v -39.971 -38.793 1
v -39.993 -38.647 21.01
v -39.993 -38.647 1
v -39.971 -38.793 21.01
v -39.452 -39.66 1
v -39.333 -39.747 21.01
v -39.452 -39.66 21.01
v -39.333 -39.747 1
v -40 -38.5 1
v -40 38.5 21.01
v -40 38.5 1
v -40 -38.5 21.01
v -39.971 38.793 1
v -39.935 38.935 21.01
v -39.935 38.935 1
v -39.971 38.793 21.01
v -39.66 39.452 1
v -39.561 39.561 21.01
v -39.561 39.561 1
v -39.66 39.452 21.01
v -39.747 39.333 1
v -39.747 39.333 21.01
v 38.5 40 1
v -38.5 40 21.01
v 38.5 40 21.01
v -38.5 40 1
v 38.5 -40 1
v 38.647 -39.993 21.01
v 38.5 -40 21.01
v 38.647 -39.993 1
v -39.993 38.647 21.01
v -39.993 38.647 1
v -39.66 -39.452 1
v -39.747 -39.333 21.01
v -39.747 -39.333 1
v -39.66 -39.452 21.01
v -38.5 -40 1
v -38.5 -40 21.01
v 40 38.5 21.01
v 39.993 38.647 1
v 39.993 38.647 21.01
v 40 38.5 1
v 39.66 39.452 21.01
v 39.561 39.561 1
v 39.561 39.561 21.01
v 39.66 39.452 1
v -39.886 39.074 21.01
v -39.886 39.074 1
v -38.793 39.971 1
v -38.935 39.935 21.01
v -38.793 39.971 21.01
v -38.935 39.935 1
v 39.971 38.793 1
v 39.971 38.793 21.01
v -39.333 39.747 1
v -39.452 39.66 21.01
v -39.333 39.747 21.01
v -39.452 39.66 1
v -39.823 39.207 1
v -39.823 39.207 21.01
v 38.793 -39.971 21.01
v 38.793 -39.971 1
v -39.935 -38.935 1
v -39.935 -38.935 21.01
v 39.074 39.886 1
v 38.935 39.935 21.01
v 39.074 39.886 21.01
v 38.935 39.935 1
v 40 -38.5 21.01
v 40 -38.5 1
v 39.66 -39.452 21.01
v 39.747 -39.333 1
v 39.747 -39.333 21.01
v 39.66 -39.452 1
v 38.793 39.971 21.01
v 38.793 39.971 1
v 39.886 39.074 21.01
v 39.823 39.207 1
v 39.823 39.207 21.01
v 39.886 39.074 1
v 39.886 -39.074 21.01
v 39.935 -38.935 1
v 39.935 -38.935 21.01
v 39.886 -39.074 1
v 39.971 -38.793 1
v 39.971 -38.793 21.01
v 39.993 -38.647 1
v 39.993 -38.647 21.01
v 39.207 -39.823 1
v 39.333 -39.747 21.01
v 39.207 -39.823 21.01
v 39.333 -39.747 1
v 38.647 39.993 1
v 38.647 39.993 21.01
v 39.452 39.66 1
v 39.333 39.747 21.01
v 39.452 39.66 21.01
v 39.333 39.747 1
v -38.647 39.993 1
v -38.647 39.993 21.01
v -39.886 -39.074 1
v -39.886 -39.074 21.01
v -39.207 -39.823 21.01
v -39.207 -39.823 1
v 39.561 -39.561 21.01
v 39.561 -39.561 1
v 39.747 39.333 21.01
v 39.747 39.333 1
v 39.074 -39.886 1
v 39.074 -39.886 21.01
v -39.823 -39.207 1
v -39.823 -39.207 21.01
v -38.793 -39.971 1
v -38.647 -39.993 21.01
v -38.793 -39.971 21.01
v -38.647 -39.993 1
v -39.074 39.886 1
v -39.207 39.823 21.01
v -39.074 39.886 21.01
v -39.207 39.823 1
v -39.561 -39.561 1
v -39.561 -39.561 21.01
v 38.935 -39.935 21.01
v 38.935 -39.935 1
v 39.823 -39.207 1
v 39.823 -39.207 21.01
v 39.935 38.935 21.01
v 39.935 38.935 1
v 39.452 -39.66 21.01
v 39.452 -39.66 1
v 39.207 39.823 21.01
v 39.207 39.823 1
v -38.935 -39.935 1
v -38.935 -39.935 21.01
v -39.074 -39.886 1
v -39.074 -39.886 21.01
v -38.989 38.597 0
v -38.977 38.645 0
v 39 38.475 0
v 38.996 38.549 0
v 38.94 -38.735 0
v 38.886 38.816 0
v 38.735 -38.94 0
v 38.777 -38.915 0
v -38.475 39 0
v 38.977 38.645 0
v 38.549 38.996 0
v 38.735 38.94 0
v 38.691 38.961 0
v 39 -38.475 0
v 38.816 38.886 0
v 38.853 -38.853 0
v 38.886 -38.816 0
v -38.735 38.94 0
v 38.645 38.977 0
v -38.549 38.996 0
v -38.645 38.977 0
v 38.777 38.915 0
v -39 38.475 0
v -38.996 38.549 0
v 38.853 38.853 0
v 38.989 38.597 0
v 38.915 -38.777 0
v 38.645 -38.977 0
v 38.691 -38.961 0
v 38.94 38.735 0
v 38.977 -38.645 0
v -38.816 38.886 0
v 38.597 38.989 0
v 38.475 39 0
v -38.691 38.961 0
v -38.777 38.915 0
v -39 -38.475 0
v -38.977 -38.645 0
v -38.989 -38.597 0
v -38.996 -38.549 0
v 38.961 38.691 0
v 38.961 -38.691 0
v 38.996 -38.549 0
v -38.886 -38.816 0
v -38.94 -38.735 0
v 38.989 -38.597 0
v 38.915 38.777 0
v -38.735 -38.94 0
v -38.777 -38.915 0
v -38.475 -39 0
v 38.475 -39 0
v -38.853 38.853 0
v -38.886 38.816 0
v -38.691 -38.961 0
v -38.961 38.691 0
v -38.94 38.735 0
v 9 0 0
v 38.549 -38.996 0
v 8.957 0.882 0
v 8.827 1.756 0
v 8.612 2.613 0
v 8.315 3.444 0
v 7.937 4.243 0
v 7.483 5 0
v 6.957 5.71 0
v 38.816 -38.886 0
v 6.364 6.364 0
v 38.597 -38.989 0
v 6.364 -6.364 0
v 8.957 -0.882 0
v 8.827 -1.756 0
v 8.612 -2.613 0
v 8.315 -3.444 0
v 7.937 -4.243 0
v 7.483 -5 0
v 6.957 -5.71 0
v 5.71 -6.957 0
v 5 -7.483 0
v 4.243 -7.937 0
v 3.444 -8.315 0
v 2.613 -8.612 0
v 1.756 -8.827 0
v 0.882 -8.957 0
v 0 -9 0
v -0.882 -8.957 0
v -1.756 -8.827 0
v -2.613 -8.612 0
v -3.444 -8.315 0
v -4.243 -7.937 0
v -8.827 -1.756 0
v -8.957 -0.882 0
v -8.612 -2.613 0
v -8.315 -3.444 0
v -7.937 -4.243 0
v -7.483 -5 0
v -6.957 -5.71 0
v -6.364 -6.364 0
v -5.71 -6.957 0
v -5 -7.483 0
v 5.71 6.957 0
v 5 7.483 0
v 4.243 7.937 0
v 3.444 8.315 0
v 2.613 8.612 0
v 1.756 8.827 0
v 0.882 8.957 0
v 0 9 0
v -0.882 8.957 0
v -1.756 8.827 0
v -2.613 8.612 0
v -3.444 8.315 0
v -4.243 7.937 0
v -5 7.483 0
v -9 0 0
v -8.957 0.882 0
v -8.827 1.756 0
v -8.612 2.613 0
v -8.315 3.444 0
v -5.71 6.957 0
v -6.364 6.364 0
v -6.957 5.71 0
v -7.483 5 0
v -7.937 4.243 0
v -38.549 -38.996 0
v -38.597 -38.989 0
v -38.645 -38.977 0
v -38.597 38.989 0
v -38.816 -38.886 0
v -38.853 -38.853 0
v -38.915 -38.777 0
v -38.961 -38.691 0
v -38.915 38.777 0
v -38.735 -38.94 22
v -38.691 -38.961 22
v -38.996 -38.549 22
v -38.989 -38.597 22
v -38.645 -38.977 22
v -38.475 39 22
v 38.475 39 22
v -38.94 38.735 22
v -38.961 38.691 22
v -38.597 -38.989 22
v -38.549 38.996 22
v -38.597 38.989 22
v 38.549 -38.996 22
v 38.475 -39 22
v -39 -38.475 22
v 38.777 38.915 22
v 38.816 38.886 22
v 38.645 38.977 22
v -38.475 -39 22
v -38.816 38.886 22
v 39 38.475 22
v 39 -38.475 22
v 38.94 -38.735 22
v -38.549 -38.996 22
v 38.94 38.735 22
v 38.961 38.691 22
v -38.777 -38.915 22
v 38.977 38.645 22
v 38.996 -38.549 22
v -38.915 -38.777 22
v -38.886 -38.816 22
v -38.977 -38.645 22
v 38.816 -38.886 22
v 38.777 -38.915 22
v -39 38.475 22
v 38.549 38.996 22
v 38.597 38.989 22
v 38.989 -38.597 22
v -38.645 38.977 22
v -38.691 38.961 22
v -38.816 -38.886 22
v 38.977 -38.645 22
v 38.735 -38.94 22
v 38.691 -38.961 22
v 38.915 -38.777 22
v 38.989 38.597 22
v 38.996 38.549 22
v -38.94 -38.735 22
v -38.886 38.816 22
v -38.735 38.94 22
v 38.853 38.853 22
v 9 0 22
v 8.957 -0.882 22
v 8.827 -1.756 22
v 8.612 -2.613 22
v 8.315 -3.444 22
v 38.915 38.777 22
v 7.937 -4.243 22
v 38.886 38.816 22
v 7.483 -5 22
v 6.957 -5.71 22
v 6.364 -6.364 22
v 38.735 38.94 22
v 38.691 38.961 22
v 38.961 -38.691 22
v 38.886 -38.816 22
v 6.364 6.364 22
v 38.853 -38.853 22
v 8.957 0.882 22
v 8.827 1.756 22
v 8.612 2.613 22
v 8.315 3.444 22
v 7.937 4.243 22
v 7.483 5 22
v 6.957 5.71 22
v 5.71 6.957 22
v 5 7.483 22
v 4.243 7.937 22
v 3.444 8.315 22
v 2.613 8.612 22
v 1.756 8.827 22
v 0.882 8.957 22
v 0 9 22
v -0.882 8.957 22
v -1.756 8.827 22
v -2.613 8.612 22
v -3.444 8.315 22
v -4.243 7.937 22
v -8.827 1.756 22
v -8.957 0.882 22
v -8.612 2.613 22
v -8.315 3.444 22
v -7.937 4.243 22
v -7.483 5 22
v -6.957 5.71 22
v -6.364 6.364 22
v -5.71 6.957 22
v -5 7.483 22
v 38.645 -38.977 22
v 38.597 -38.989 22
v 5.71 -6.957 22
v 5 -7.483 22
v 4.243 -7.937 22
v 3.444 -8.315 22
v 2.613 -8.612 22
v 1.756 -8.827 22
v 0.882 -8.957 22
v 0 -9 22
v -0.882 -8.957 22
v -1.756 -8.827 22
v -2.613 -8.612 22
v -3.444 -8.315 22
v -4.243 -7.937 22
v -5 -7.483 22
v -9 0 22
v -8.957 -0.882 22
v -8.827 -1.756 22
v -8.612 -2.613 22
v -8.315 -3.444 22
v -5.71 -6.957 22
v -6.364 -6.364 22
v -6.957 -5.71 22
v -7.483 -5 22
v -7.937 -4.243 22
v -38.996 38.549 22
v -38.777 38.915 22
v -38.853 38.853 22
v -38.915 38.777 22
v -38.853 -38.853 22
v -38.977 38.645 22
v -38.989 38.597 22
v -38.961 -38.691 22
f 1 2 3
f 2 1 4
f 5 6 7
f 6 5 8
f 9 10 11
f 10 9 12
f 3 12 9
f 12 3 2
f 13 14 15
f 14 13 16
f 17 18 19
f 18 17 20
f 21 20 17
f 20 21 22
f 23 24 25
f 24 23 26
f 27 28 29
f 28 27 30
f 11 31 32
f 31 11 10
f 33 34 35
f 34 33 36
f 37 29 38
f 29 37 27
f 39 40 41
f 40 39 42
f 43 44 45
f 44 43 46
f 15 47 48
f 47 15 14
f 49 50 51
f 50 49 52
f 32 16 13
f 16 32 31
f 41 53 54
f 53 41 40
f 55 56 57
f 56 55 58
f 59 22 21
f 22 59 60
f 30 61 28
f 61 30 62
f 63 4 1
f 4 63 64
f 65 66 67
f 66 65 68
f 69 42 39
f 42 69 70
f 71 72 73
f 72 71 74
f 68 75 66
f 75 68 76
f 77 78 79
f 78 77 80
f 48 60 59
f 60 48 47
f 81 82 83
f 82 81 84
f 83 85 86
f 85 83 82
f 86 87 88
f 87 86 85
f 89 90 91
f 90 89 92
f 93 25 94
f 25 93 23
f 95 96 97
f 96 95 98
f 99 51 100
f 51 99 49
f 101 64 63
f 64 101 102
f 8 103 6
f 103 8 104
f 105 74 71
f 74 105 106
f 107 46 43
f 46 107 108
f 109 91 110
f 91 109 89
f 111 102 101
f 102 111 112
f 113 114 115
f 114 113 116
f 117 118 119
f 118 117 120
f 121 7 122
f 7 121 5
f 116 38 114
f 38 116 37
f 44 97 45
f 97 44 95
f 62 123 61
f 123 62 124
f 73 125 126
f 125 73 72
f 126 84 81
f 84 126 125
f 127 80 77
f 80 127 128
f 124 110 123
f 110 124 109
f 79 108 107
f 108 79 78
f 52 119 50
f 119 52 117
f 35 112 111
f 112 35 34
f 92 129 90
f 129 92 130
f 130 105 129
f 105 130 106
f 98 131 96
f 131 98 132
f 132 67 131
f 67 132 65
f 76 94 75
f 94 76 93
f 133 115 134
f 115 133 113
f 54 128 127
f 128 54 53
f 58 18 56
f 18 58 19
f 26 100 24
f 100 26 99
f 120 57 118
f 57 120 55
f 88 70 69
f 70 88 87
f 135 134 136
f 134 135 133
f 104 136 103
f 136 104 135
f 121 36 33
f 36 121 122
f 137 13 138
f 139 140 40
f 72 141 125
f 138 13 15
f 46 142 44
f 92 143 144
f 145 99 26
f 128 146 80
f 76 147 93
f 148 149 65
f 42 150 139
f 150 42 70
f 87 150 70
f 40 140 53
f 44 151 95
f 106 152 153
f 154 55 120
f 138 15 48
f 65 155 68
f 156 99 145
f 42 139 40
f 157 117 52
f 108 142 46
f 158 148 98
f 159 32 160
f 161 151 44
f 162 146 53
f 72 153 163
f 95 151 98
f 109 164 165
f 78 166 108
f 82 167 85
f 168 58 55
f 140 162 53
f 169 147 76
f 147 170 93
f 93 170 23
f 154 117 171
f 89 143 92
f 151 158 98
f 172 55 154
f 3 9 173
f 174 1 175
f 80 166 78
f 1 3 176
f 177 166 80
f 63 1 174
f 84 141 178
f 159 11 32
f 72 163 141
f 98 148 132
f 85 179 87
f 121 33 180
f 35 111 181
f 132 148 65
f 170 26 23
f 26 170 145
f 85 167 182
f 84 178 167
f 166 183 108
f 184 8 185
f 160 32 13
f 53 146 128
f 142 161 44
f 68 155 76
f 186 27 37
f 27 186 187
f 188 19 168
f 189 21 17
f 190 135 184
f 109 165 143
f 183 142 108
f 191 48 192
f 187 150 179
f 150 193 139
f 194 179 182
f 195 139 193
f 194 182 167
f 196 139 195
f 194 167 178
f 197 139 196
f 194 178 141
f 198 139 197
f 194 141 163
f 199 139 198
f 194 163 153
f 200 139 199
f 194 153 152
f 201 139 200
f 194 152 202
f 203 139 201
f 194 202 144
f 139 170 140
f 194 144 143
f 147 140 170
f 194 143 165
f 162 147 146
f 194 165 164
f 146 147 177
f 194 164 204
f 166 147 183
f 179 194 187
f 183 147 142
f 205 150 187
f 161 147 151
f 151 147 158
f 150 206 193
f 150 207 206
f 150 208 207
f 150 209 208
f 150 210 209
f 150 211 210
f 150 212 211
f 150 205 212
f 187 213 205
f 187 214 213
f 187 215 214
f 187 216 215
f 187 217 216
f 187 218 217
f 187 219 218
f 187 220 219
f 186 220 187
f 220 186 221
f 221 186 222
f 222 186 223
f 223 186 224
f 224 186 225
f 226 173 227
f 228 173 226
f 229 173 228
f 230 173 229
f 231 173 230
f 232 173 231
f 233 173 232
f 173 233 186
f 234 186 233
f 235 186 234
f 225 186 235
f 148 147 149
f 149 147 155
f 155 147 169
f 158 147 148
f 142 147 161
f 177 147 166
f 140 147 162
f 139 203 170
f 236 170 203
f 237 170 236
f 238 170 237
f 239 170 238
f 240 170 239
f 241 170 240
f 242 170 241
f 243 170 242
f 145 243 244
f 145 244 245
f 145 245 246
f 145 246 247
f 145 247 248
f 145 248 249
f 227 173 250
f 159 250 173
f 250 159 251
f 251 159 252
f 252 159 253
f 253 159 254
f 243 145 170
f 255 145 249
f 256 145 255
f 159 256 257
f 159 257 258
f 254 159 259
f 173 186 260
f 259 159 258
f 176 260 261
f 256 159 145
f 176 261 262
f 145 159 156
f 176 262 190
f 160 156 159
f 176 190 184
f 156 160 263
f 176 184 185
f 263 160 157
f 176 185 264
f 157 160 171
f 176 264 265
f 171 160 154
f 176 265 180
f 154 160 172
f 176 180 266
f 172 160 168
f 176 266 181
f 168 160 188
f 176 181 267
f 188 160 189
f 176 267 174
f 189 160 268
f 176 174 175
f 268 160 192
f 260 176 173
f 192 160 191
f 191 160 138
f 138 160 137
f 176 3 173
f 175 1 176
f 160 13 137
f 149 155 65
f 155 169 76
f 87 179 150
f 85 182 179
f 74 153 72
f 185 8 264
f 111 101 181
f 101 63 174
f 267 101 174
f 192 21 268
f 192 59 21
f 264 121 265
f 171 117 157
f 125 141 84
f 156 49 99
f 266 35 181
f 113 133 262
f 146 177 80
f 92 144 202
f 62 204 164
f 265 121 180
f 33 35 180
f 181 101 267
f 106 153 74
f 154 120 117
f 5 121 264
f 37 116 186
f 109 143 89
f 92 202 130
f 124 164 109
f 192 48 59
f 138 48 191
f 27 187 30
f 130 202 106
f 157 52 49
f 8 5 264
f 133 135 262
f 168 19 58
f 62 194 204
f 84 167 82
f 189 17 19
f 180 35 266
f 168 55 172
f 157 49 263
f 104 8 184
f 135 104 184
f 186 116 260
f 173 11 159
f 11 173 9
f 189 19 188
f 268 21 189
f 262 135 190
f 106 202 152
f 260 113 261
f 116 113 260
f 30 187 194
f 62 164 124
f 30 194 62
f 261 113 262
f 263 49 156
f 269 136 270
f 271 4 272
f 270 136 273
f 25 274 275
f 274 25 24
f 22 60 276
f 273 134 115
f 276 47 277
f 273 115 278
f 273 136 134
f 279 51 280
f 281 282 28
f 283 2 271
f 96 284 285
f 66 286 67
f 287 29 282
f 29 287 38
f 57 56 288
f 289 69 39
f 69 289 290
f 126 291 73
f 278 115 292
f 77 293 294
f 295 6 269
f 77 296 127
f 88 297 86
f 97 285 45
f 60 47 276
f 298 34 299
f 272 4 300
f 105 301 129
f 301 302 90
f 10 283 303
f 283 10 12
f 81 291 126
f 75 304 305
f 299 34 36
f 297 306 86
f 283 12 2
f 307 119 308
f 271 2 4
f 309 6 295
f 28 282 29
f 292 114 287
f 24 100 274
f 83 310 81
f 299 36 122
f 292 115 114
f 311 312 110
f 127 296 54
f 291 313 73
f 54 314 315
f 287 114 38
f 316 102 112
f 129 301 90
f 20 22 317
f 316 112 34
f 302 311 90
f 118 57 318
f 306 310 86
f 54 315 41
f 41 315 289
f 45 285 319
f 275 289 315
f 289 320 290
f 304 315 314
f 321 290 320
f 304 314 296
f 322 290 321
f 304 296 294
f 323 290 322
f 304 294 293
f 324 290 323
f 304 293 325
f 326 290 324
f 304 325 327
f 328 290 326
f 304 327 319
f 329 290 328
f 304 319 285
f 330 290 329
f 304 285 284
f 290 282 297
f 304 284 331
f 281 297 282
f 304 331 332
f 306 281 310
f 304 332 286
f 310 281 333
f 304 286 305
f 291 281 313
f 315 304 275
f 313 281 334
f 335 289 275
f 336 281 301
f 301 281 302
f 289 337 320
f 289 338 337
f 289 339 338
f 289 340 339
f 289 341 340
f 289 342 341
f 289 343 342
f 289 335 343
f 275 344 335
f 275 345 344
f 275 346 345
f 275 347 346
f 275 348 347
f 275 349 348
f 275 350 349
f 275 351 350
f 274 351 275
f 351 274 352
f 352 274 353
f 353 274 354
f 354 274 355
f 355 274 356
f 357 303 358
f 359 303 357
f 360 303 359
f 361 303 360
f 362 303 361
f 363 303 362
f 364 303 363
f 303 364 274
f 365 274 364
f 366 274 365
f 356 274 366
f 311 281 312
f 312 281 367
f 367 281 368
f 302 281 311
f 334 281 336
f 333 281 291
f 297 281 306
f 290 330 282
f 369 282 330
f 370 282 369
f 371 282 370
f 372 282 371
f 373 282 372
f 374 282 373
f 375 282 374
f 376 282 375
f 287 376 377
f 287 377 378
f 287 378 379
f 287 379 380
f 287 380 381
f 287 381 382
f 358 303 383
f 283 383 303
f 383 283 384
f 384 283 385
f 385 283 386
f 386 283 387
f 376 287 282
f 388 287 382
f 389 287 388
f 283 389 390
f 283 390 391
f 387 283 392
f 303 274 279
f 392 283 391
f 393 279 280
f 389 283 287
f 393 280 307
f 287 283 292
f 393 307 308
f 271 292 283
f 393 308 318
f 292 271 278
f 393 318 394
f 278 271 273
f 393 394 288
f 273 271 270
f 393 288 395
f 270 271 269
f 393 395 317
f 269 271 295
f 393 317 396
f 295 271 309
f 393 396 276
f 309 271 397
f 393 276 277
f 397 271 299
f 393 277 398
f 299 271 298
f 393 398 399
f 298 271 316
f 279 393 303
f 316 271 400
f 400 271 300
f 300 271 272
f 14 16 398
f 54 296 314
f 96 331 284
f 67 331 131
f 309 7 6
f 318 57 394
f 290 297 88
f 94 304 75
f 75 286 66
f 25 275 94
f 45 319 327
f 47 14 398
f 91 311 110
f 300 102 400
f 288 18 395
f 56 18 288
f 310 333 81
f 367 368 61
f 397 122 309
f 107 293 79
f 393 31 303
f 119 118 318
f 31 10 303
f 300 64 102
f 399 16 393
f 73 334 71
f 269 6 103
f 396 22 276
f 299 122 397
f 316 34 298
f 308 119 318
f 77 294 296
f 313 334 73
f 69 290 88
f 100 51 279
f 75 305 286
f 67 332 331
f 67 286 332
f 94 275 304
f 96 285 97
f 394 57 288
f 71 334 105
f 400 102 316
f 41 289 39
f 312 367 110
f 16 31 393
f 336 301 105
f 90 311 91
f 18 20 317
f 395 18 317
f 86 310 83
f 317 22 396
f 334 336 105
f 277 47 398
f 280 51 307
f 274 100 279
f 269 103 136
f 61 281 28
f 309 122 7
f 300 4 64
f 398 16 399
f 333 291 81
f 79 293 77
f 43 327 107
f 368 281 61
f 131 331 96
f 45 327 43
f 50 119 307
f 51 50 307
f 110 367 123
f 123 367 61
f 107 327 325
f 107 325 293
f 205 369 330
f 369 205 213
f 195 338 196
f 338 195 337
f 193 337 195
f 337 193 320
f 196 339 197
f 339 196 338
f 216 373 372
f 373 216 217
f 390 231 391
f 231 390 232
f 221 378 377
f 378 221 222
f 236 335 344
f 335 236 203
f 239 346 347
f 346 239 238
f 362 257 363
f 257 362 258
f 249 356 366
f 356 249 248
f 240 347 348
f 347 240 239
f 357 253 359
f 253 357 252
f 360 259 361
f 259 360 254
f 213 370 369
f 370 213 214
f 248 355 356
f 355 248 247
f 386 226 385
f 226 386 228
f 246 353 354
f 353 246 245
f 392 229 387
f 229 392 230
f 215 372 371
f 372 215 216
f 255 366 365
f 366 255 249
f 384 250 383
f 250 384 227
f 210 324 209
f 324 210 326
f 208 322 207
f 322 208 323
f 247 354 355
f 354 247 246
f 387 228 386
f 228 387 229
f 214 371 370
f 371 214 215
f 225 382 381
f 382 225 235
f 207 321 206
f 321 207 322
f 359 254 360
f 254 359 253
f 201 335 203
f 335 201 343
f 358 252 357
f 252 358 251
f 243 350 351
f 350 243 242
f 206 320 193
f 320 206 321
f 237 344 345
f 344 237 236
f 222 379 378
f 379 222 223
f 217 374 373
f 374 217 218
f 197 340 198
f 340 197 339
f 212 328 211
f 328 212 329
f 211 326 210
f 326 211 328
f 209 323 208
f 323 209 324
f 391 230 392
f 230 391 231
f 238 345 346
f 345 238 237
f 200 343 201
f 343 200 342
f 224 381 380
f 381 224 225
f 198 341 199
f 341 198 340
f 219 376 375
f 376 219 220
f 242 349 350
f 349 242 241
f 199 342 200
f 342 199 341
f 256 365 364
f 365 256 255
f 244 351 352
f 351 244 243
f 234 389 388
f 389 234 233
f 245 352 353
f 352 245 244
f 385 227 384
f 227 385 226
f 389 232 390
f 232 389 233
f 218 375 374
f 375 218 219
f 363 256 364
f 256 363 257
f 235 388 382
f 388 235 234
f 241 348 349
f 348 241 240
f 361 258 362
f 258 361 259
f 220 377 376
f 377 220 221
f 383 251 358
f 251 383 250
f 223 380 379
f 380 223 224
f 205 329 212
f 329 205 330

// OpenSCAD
// BM-ISO-SM main body isolator pad, small-height stations
// J40 rubber recreation 3D model, units: millimetres.
// Generated by tools/generate_rubber_recreation_3d_models.py.
// OpenSCAD is the source model; export STL only after release parameters are set.

$fn = 64;

module rounded_rect_2d(size, r) {
  hull() {
    translate([-(size[0] / 2 - r), -(size[1] / 2 - r)]) circle(r = r);
    translate([ (size[0] / 2 - r), -(size[1] / 2 - r)]) circle(r = r);
    translate([ (size[0] / 2 - r),  (size[1] / 2 - r)]) circle(r = r);
    translate([-(size[0] / 2 - r),  (size[1] / 2 - r)]) circle(r = r);
  }
}

module capsule_2d(length, width) {
  hull() {
    translate([-(length - width) / 2, 0]) circle(d = width);
    translate([ (length - width) / 2, 0]) circle(d = width);
  }
}

module chamfered_extrude(height, edge_chamfer = 0) {
  eps = 0.01;
  if (edge_chamfer <= 0) {
    linear_extrude(height = height, center = false)
      children();
  } else {
    union() {
      translate([0, 0, edge_chamfer])
        linear_extrude(height = height - (2 * edge_chamfer), center = false)
          children();

      hull() {
        translate([0, 0, 0])
          linear_extrude(height = eps, center = false)
            offset(delta = -edge_chamfer)
              children();
        translate([0, 0, edge_chamfer])
          linear_extrude(height = eps, center = false)
            children();
      }

      hull() {
        translate([0, 0, height - edge_chamfer])
          linear_extrude(height = eps, center = false)
            children();
        translate([0, 0, height - eps])
          linear_extrude(height = eps, center = false)
            offset(delta = -edge_chamfer)
              children();
      }
    }
  }
}

// Current order basis:
// - Square solid pad 80 x 80 x 22.
// - 3D envelope is length x width x height; plan corner radius 1.5 mm.
// - Top and bottom perimeter edge break/chamfer is modelled at 1.0 mm by default.
// - Production bore is 18.0 mm for the Toyota 90560-12009 style body-mount spacer.
// - Toyota 90560-12009 is the best release basis: 48.1 mm spacer length, six sleeves.
// - Production release uses hole_d = 18.0; hole_d = 0 is a non-release CAD override.

module bm_iso_sm_square_pad(
  pad_size = 80,
  pad_height = 22,
  corner_r = 1.5,
  edge_chamfer = 1.0,
  hole_d = 18.0,
  center_mark = true
) {
  difference() {
    chamfered_extrude(height = pad_height, edge_chamfer = edge_chamfer)
      rounded_rect_2d([pad_size, pad_size], corner_r);

    if (hole_d > 0)
      translate([0, 0, -1])
        cylinder(h = pad_height + 2, d = hole_d);

    if (hole_d == 0 && center_mark)
      translate([0, 0, pad_height - 0.8])
        cylinder(h = 1.0, d = 4.0);
  }
}

bm_iso_sm_square_pad();
